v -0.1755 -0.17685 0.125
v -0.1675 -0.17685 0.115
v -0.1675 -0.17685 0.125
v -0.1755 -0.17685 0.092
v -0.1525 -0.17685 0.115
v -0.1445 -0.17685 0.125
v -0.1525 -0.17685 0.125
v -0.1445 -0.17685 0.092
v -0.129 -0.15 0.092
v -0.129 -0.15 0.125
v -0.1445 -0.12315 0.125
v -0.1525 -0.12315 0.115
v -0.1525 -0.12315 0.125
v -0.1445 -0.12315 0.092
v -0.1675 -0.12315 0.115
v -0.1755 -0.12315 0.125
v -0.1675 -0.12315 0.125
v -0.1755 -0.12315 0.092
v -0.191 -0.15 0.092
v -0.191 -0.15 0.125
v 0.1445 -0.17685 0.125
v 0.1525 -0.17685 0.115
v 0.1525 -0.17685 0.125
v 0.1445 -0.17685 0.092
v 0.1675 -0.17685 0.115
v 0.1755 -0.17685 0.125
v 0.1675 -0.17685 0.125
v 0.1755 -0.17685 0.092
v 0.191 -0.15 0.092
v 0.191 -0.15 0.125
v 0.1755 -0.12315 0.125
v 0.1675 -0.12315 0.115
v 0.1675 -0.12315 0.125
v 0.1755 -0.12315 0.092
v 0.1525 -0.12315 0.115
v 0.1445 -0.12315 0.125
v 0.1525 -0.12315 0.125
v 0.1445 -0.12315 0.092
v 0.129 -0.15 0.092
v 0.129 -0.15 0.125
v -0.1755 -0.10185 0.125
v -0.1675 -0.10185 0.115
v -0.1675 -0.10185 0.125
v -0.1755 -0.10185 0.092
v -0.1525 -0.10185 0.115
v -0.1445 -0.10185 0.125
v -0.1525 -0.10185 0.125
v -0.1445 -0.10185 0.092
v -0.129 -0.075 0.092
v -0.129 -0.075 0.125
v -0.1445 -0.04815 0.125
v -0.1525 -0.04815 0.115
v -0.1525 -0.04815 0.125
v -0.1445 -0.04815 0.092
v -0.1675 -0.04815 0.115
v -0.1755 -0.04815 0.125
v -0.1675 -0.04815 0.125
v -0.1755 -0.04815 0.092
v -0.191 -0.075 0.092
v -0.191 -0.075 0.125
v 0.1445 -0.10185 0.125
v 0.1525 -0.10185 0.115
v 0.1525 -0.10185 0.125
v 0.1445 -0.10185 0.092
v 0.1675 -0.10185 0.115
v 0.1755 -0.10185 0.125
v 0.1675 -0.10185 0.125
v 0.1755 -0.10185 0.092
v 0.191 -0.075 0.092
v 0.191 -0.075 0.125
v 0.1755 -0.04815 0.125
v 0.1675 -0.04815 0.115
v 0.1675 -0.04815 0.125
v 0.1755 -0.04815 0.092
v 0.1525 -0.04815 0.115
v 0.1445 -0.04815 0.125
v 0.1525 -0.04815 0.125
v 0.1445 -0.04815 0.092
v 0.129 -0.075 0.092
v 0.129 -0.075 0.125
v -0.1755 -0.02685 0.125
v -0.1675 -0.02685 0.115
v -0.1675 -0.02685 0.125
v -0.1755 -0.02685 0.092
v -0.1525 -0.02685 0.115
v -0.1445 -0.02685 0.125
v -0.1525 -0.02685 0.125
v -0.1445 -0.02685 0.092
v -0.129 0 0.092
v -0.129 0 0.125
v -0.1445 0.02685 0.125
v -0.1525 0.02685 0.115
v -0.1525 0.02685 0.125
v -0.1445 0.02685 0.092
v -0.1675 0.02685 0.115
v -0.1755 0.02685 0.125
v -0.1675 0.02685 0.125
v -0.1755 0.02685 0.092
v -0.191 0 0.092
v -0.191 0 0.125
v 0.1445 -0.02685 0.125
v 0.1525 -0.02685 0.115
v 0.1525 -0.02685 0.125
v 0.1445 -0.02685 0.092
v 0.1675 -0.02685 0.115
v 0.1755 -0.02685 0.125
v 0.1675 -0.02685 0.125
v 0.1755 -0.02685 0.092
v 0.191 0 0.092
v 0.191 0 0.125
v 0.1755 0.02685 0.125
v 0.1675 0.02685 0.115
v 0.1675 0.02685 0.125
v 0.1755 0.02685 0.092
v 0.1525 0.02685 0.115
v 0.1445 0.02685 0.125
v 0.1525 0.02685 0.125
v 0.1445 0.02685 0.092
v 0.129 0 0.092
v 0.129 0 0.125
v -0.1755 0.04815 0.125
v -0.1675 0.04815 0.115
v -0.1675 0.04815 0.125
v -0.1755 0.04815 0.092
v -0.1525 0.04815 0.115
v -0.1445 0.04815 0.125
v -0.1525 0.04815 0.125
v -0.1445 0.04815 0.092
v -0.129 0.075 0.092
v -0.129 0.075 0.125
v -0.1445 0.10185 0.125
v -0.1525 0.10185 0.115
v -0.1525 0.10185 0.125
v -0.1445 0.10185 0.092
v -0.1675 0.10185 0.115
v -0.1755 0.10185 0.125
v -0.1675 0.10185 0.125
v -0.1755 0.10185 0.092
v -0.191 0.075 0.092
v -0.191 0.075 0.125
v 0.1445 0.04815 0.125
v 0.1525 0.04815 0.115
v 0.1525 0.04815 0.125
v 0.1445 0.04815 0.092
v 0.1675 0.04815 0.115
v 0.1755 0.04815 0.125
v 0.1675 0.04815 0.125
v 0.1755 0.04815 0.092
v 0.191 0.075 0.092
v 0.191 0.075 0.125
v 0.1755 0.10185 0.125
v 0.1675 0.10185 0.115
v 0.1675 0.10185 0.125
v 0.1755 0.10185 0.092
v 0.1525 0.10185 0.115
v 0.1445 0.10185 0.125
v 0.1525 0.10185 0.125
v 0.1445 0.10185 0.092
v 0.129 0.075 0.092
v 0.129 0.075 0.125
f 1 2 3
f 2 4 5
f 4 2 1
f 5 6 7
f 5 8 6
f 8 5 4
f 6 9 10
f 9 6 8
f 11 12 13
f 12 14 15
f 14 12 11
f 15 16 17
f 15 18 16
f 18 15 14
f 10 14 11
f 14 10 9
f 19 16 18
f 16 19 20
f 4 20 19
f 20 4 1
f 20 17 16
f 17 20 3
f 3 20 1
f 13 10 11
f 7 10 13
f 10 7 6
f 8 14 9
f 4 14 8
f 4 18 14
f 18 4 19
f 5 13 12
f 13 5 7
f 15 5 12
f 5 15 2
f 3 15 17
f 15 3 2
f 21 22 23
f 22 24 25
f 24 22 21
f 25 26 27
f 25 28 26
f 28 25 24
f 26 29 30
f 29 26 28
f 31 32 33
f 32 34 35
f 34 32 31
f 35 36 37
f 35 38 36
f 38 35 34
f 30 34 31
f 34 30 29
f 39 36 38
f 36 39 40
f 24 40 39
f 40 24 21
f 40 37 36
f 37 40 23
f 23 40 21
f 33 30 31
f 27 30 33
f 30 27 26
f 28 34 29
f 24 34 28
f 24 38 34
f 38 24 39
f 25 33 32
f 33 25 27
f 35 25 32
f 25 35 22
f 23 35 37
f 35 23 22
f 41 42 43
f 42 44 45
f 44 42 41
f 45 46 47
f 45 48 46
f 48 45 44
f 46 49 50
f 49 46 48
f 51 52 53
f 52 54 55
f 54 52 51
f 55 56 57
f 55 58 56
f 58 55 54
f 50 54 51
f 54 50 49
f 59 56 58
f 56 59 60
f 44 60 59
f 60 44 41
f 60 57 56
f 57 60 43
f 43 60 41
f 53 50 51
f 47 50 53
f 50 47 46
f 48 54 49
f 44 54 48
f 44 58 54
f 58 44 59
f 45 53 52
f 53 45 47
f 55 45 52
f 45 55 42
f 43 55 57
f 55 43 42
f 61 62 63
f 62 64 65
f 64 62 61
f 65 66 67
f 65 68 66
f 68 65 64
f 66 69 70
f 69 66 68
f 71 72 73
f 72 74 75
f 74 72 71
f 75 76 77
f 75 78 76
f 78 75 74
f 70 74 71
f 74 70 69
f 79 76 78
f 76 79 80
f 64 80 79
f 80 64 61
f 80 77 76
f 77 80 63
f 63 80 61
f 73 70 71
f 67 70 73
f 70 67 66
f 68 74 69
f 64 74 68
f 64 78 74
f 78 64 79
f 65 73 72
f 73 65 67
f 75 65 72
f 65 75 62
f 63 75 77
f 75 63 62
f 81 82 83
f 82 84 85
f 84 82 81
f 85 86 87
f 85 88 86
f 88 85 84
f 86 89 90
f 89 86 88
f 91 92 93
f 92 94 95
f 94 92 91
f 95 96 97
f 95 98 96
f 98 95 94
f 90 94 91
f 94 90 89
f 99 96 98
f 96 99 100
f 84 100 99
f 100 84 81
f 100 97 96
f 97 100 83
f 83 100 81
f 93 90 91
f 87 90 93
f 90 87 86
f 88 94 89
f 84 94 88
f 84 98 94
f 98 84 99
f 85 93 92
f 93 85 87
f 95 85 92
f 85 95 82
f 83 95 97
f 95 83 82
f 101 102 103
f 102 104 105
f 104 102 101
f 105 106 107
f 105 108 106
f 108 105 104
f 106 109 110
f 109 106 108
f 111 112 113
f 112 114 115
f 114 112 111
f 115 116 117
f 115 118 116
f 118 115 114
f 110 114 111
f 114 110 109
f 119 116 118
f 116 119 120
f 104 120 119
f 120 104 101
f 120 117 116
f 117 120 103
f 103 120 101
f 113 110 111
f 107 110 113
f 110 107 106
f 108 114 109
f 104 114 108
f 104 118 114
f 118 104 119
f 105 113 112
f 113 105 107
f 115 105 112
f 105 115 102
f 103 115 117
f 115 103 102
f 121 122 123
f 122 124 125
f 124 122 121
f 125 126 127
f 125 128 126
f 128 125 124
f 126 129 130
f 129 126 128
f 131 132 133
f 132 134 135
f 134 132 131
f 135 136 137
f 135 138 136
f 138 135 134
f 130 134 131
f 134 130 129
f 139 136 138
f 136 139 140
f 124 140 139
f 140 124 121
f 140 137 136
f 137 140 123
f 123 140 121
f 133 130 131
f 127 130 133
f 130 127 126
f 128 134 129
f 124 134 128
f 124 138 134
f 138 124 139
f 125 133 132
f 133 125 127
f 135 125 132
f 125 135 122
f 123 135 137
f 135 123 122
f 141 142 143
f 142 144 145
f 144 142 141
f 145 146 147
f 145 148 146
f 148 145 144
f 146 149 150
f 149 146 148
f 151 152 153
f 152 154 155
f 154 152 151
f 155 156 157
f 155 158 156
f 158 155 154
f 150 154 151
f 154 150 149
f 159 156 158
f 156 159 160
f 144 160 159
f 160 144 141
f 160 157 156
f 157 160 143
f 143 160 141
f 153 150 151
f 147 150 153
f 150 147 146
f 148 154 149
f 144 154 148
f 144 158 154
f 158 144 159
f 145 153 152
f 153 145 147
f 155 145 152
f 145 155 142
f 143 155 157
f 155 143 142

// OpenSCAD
// file: Text_shared.scad
char_depth = 0.0001;

char_pixelsz = 0.02/5;
char_pheight = 5;
char_max_pwidth = 5;

function sum(list) = list * [for (_=list) 1];
function partialsum(list, end) = list * [for (i=[0:len(list)-1]) i < end ? 1 : 0];

module _Text_Line(a, b) {
  l = norm(b-a);
  f = l > 0 ? (b-a)/l : [1, 0];
  r = [f.y, -f.x];
  ea = -0.5*f;
  eb = (l+0.5)*f;
  sr = 0.5*r;
  sl = -sr;
  polygon([
    a+ea+sr,
    a+eb+sr,
    a+eb+sl,
    a+ea+sl,
  ]*char_pixelsz);
}

module _Text_Segments(pts, off=[0,0]) {
  for (i=[0:len(pts)-2]) {
    pa = pts[i];
    pb = pts[i+1];
    if (len(pa) == 2 && len(pb) == 2)
      _Text_Line(pts[i]+off, pts[i+1]+off);
  }
}

_Letters = [
  [[-2, -2], [-2, 2], [2, 2], [2, -2], [2, 0], [-2, 0]], // A
  [], // B
  [[2, -2], [-2, -2], [-2, 2], [2, 2]], // C
  [[2, 0.5], [2, -2], [-2, -2], [-2, 2], [0.5, 2], [], [3, 0], [0, 3]], // D
  [[2, -2], [-2, -2], [-2, 2], [2, 2], [], [-2, 0], [0, 0]], // E
  [[2, 2], [-2, 2], [-2, -2], [-2, 0], [0, 0]], // F
  [[0, 0], [2, 0], [2, -2], [-2, -2], [-2, 2], [2, 2]], // G
  [], // H
  [[0, -2], [0, 2]], // I
  [], // J
  [], // K
  [[-2, 2], [-2, -2], [2, -2]], // L
  [], // M
  [], // N
  [[-2, -2], [-2, 2], [2, 2], [2, -2], [-2, -2]], // O
  [[-2, -2], [-2, 2], [2, 2], [2, 0], [-2, 0]], // P
  [], // Q
  [[-2, -2], [-2, 2], [2, 2], [2, 0], [-2, 0], [1, -3]], // R
  [], // S
  [], // T
  [], // U
  [], // V
  [], // W
  [], // X
  [], // Y
  [], // Z
  [[-2, 2], [2, 2], [2, 0], [0, 0], [], [0, -2], [0, -2]], // ? for missing
];

function _Letter_Lookup(c) =
  let(
    ci=ord(c),
    li=ci-ord("A"),
    issp=ci==32,
    lps=li>=0&&li<26 ? _Letters[li] : [],
    lpf=len(lps)==0 ? _Letters[26] : lps
  ) issp ? [] : lpf;

function _Letter_Bounds(letter) =
  let(
    fletter = concat([[0, 0]], [for (l=letter) len(l)==2 ? l : [0,0]]),
    xs = [for (l=fletter) l.x],
    ys = [for (l=fletter) l.y]
  ) [min(xs), min(ys), max(xs), max(ys)];

module Text(letters) {
  lbounds = [for (l=letters) _Letter_Bounds(l)];
  lwidths = [for (b=lbounds) min(b.z-b.x+1, char_max_pwidth)];
  lmins = [for (b=lbounds) b.x];
  twid = sum(lwidths) + len(letters)-1;
  startoff = (1-twid)/2;
  offs = [for (i=[0:len(letters)-1]) startoff+i+partialsum(lwidths, i)];
  linear_extrude(height=char_depth) {
    for (i=[0:len(letters)-1]) if (len(letters[i]) > 0) {
      letter = letters[i];
      off = offs[i];
      left = off-lmins[i];
      wid = lwidths[i];
      intersection() {
        _Text_Segments(letter, [left, 0]);
        scale([char_pixelsz,char_pixelsz]) translate([off-0.5, -char_pheight/2])
          square(size=[wid, char_pheight]);
      }
    }
  }
}

module Text(text) {
  letters = [for (c=text) _Letter_Lookup(c)];
  lbounds = [for (l=letters) _Letter_Bounds(l)];
  lwidths = [for (b=lbounds) min(b.z-b.x+1, char_max_pwidth)];
  lmins = [for (b=lbounds) b.x];
  twid = sum(lwidths) + len(letters)-1;
  startoff = (1-twid)/2;
  offs = [for (i=[0:len(letters)-1]) startoff+i+partialsum(lwidths, i)];
  linear_extrude(height=char_depth) {
    for (i=[0:len(letters)-1]) if (len(letters[i]) > 0) {
      letter = letters[i];
      off = offs[i];
      left = off-lmins[i];
      wid = lwidths[i];
      intersection() {
        _Text_Segments(letter, [left, 0]);
        scale([char_pixelsz,char_pixelsz]) translate([off-0.5, -char_pheight/2])
          square(size=[wid, char_pheight]);
      }
    }
  }
}
// file: DataSymbol.scad
boxSize = 0.029;
lineSize = 0.0045;
symDepth = 0.01;
vertSeparation = 0.019;
horizSeparation = 0.018;

module DataSymbol() {
  boxVertCenter = (boxSize+vertSeparation)/2;
  boxHorizCenter = (boxSize+horizSeparation)/2;
  linear_extrude(symDepth, center=true) {
    translate([0,boxVertCenter]) square(boxSize, center=true); // top box
    translate([-boxHorizCenter,-boxVertCenter]) square(boxSize, center=true); // bottom left box
    translate([boxHorizCenter,-boxVertCenter]) square(boxSize, center=true); // bottom right box
    square([2*boxHorizCenter + lineSize, lineSize], center=true); // middle line
    translate([0, horizSeparation/4]) square([lineSize, horizSeparation/2 + lineSize], center=true); // line to top
    translate([-boxHorizCenter, -horizSeparation/4]) square([lineSize, horizSeparation/2 + lineSize], center=true); // line to bottom left
    translate([boxHorizCenter, -horizSeparation/4]) square([lineSize, horizSeparation/2 + lineSize], center=true); // line to bottom right
  }
}

DataSymbol();
// file: PowerSymbol.scad
symWidth = 0.038;
symHeight = 0.086;
symDepth = 0.01;
middleHeight = 0.0075;
topHorizOffset = 0.007;
sideVertOffset = 0.007;

module PowerSymbol() {
  linear_extrude(symDepth, center=true) {
    halfHei = symHeight/2;
    halfWid = symWidth/2;
    halfMid = middleHeight/2;
    polygon([
      [topHorizOffset, halfHei],
      [0, halfMid],
      [halfWid, sideVertOffset],
      [-topHorizOffset, -halfHei],
      [0, -halfMid],
      [-halfWid, -sideVertOffset]
    ]);
  }
}

PowerSymbol();
// file: BasicFPGAHousing_base.scad
include <FPGA_shared.scad>;
use <BasicFPGAHousing_paintcap.scad>;
use <PowerSymbol.scad>;
use <DataSymbol.scad>;

module BasicFPGAHousing_chipcutout() {
  slotPinBaseOffset = (-slotPinEdgeCount-1)/2 * slotPinEdgeSpacing;
  slotPinEdgeOffset = slotSize/2 - slotPinSize/2 - slotPinEdgePad;
  union() {
    translate([0, 0, baseDepth/2 + slotBottom + slotPinDepth]) {
      cube(size=[slotSize, slotSize, baseDepth], center=true);
    }
    for(edge=[1:4]) rotate([0,0,90*edge]) {
      for(i=[1:slotPinEdgeCount]) {
        translate([
          slotPinBaseOffset + slotPinEdgeSpacing*i,
          slotPinEdgeOffset,
          slotBottom + slotPinDepth
        ]) {
          cube(size=[slotPinSize, slotPinSize, slotPinDepth*2], center=true);
        }
      }
    }
    translate([alignHoleOffset,alignHoleOffset,slotBottom + slotPinDepth])
      cylinder(h=alignHoleDepth*2, r=alignHoleRadius, center=true, $fn=alignHoleSides);
  }
}

module BasicFPGAHousing_base() {
  middleSize = (slotSize + capSize) / 2;
  difference() {
    union() {
      translate([0,0,baseCenter])
        cube(size=[baseSize, baseSize, baseDepth], center=true);
      translate([0,0,baseTop-eps])
        cube(size=[middleSize, middleSize, capDepth*2], center=true);
    }
    translate([0,0,baseBottom])
      cube(size=[baseBackCutoutSize, baseBackCutoutSize, baseBackCutoutDepth*2], center=true);
    BasicFPGAHousing_chipcutout();
  }
}

BasicFPGAHousing_base();
%BasicFPGAHousing_paintcap();
// file: Text_FPGAREADER.scad
include <Text_shared.scad>;

module Text_FPGAREADER() {
  Text("FPGA READER");
}

Text_FPGAREADER();
// file: BasicFPGAHousing_paintcap.scad
include <FPGA_shared.scad>;
use <BasicFPGAHousing_base.scad>;

module BasicFPGAHousing_paintcap() {
  bevelDepth = capBevel * sqrt(2);
  difference() {
    translate([0,0,baseTop]) {
      cube(size=[capSize, capSize, capDepth*2], center=true);
    }
    cube(size=[slotSize+eps, slotSize+eps, smallGridSize], center=true);
    for (edge=[1:4]) rotate([0,0,90*edge]) {
      translate([0,capSize/2,baseTop+capDepth]) rotate([45,0,0])
        cube(size=[capSize+0.1, bevelDepth, bevelDepth*2], center=true);
    }
  }
}

%BasicFPGAHousing_base();
BasicFPGAHousing_paintcap();
// file: BasicFPGAHousing_readerbase.scad
include <FPGA_shared.scad>;
use <BasicFPGAHousing_base.scad>;
use <BasicFPGAHousing_paintcap.scad>;
use <PowerSymbol.scad>;
use <DataSymbol.scad>;

module BasicFPGAHousing_readerbase() {
  difference() {
    BasicFPGAHousing_base();
    cablecutout();
    rotate([0,0,90]) cablecutout();
    rotate([0,0,-90]) cablecutout();
  }
}

BasicFPGAHousing_readerbase();
%BasicFPGAHousing_paintcap();
%translate([0.067,0.25,-0.001]) rotate([-90, 0, 0]) PowerSymbol();
%translate([-0.25,0.073,0.001]) rotate([90, 0, 90]) DataSymbol();
%translate([0.25,0.073,0.001]) rotate([90, 0, -90]) DataSymbol();
// file: ConfigScrew.scad
screw_radius = 0.031;
screw_height = 0.030;

notch_width = 0.015;
notch_depth = 0.010;

module ConfigScrew() {
  difference() {
    translate([0,0,screw_height*0.45])
      cylinder(h=screw_height*1.1, r=screw_radius, center=true, $fn=6);
    translate([0,0,screw_height])
      cube([notch_width, screw_radius*3, notch_depth*2], center=true);
  }
}

ConfigScrew();
// file: FPGA_shared.scad
smallGridSize = 0.5;
baseSize = smallGridSize;
baseTop = 0.05;
baseBottom = -0.045;
baseDepth = baseTop - baseBottom;
baseCenter = (baseTop + baseBottom)/2;
baseBackRim = 0.02;
baseBackCutoutSize = baseSize - baseBackRim*2;
baseBackCutoutDepth = 0.01;
capSize = 0.41;
capDepth = 0.045;
capBevel = 0.01;
slotSize = smallGridSize * 0.5;
slotBottom = 0.03;
slotPinEdgeCount = 4;
slotPinEdgePad = 0.01;
slotPinEdgeSpacing = 0.045;
slotPinSize = 0.025;
slotPinDepth = 0.025;
eps = 0.00001;
chipTotalSize = slotSize - slotPinEdgePad*2 - slotPinSize/2;
chipTotalHeight = 0.1;
chipBaseHeight = 0.05;
pinHorizLength = 0.022;
pinHorizUnderLength = 0.008;
pinHorizWidth = 0.02;
pinHorizHeight = 0.015;
pinVertInnerOffset = 0.003;
pinVertOuterOffset = 0.003;
pinVertNarrowOffset = 0.003;
pinTotalHeight = chipTotalHeight - chipBaseHeight/2 + pinHorizHeight/2;
chipBaseSize = chipTotalSize - pinHorizLength*2;
chipBaseBevelSize = 0.005;
alignHoleRadius = 0.005;
alignHoleOffset = chipBaseSize/2 - 0.02;
alignHoleDepth = 0.005;
alignHoleSides = 8;
decoPinCount = 8;
decoPinWidth = 0.036;
decoPinLength = 0.034;
decoPinHeight = 0.028;
decoPinSpacing = 0.049;
decoPinBevelSize = 0.010;

module cablecutout() {
  cableradius = 0.025;
  cableDepth = 0.0125;
  translate([0,smallGridSize/2,0]) rotate([90,0,0]) {
    cylinder(h=cableDepth*2, r=cableradius, center=true, $fn=8);
  }
}
// main file
include <FPGA_shared.scad>;
use <ConfigScrew.scad>;
use <BasicFPGAHousing_readerbase.scad>;
use <BasicFPGAHousing_paintcap.scad>;
use <Text_FPGAREADER.scad>;

screw_offset = 0.16;
screw_spacing = 0.075;

module BasicFPGAHousing_readerscrews() {
  for (sy=[-2:1]) for (sx=[-1:2:1]) translate([sx*screw_offset,sy*screw_spacing,capDepth+baseTop]) {
    ConfigScrew();
  }
}

BasicFPGAHousing_readerscrews();
%BasicFPGAHousing_readerbase();
%BasicFPGAHousing_paintcap();
%translate([0,0.16,0.095]) Text_FPGAREADER();
